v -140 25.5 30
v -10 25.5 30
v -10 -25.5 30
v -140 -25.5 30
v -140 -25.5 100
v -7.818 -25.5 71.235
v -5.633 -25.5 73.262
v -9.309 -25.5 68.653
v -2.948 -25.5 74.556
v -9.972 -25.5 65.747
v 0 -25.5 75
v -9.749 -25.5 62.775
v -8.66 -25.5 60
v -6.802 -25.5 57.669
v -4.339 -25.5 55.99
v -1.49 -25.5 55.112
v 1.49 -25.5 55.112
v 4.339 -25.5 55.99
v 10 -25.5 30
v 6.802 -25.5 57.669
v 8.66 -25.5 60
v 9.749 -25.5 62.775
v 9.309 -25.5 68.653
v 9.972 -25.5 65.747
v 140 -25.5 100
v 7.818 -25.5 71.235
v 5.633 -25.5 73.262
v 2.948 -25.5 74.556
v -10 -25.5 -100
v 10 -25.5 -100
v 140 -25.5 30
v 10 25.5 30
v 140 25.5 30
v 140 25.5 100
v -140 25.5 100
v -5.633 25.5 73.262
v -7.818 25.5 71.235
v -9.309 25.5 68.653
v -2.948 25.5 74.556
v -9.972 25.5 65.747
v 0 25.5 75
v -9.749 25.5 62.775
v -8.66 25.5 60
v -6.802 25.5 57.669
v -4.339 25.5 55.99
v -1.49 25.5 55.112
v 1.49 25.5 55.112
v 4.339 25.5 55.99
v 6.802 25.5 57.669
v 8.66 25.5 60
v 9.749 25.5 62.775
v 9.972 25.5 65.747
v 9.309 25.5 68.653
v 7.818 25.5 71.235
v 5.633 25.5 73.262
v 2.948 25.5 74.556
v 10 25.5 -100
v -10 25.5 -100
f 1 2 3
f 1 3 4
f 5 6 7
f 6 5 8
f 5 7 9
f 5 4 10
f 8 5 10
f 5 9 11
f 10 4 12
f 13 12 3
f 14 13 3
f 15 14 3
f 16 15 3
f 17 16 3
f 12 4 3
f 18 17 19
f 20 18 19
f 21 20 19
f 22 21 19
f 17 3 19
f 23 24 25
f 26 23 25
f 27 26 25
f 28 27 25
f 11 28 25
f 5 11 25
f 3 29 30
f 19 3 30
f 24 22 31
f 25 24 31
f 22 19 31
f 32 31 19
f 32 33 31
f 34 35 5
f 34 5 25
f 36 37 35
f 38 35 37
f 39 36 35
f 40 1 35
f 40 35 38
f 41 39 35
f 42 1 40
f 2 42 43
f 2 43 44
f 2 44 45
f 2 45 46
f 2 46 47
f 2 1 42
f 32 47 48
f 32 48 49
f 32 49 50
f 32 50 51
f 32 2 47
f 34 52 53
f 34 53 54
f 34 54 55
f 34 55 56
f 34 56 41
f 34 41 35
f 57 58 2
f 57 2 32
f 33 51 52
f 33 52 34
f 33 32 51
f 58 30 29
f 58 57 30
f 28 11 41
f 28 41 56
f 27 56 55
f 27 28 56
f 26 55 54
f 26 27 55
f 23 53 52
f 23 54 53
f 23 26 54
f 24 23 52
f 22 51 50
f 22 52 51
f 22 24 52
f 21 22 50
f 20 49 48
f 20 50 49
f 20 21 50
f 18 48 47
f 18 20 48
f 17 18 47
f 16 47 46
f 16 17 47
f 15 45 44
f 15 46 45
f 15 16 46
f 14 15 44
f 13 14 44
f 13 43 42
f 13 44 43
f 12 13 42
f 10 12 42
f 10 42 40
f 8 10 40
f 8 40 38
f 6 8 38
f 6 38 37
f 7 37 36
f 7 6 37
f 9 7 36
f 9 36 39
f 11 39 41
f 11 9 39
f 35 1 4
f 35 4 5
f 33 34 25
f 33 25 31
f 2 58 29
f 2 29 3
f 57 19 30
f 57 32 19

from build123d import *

# Parameters (mm, degrees)
EXTRUDE_1_DEPTH          = 25.5
CUT_EXTRUDE_1_DEPTH      = 174.925990007
CUT_EXTRUDE_1_DEPTH_BACK = 174.925990007
SKETCH_2_R               = 10


with BuildPart() as part:
    # Эскиз1 → Бобышка-Вытянуть1 (new, symmetric)
    with BuildSketch(Plane(origin=(0, 0, 0), x_dir=(1, 0, 0), z_dir=(0, 1, 0))):
        Polygon((10, 100), (-10, 100), (-10, -30), (-140, -30), (-140, -100), (140, -100), (140, -30), (10, -30), align=None)
    extrude(amount=EXTRUDE_1_DEPTH, both=True)

    # Эскиз2 → Вырез-Вытянуть1 (cut, two sides: drawn at the far end of the back side and taken through both)
    with BuildSketch(Plane(origin=(0, 0, 0), x_dir=(1, 0, 0), z_dir=(0, 1, 0)).offset(-CUT_EXTRUDE_1_DEPTH_BACK)):
        with Locations(Location((0, -65, 0), (0, 0, 270))):
            Circle(SKETCH_2_R)
    extrude(amount=CUT_EXTRUDE_1_DEPTH + CUT_EXTRUDE_1_DEPTH_BACK, mode=Mode.SUBTRACT)


solid = part.part
